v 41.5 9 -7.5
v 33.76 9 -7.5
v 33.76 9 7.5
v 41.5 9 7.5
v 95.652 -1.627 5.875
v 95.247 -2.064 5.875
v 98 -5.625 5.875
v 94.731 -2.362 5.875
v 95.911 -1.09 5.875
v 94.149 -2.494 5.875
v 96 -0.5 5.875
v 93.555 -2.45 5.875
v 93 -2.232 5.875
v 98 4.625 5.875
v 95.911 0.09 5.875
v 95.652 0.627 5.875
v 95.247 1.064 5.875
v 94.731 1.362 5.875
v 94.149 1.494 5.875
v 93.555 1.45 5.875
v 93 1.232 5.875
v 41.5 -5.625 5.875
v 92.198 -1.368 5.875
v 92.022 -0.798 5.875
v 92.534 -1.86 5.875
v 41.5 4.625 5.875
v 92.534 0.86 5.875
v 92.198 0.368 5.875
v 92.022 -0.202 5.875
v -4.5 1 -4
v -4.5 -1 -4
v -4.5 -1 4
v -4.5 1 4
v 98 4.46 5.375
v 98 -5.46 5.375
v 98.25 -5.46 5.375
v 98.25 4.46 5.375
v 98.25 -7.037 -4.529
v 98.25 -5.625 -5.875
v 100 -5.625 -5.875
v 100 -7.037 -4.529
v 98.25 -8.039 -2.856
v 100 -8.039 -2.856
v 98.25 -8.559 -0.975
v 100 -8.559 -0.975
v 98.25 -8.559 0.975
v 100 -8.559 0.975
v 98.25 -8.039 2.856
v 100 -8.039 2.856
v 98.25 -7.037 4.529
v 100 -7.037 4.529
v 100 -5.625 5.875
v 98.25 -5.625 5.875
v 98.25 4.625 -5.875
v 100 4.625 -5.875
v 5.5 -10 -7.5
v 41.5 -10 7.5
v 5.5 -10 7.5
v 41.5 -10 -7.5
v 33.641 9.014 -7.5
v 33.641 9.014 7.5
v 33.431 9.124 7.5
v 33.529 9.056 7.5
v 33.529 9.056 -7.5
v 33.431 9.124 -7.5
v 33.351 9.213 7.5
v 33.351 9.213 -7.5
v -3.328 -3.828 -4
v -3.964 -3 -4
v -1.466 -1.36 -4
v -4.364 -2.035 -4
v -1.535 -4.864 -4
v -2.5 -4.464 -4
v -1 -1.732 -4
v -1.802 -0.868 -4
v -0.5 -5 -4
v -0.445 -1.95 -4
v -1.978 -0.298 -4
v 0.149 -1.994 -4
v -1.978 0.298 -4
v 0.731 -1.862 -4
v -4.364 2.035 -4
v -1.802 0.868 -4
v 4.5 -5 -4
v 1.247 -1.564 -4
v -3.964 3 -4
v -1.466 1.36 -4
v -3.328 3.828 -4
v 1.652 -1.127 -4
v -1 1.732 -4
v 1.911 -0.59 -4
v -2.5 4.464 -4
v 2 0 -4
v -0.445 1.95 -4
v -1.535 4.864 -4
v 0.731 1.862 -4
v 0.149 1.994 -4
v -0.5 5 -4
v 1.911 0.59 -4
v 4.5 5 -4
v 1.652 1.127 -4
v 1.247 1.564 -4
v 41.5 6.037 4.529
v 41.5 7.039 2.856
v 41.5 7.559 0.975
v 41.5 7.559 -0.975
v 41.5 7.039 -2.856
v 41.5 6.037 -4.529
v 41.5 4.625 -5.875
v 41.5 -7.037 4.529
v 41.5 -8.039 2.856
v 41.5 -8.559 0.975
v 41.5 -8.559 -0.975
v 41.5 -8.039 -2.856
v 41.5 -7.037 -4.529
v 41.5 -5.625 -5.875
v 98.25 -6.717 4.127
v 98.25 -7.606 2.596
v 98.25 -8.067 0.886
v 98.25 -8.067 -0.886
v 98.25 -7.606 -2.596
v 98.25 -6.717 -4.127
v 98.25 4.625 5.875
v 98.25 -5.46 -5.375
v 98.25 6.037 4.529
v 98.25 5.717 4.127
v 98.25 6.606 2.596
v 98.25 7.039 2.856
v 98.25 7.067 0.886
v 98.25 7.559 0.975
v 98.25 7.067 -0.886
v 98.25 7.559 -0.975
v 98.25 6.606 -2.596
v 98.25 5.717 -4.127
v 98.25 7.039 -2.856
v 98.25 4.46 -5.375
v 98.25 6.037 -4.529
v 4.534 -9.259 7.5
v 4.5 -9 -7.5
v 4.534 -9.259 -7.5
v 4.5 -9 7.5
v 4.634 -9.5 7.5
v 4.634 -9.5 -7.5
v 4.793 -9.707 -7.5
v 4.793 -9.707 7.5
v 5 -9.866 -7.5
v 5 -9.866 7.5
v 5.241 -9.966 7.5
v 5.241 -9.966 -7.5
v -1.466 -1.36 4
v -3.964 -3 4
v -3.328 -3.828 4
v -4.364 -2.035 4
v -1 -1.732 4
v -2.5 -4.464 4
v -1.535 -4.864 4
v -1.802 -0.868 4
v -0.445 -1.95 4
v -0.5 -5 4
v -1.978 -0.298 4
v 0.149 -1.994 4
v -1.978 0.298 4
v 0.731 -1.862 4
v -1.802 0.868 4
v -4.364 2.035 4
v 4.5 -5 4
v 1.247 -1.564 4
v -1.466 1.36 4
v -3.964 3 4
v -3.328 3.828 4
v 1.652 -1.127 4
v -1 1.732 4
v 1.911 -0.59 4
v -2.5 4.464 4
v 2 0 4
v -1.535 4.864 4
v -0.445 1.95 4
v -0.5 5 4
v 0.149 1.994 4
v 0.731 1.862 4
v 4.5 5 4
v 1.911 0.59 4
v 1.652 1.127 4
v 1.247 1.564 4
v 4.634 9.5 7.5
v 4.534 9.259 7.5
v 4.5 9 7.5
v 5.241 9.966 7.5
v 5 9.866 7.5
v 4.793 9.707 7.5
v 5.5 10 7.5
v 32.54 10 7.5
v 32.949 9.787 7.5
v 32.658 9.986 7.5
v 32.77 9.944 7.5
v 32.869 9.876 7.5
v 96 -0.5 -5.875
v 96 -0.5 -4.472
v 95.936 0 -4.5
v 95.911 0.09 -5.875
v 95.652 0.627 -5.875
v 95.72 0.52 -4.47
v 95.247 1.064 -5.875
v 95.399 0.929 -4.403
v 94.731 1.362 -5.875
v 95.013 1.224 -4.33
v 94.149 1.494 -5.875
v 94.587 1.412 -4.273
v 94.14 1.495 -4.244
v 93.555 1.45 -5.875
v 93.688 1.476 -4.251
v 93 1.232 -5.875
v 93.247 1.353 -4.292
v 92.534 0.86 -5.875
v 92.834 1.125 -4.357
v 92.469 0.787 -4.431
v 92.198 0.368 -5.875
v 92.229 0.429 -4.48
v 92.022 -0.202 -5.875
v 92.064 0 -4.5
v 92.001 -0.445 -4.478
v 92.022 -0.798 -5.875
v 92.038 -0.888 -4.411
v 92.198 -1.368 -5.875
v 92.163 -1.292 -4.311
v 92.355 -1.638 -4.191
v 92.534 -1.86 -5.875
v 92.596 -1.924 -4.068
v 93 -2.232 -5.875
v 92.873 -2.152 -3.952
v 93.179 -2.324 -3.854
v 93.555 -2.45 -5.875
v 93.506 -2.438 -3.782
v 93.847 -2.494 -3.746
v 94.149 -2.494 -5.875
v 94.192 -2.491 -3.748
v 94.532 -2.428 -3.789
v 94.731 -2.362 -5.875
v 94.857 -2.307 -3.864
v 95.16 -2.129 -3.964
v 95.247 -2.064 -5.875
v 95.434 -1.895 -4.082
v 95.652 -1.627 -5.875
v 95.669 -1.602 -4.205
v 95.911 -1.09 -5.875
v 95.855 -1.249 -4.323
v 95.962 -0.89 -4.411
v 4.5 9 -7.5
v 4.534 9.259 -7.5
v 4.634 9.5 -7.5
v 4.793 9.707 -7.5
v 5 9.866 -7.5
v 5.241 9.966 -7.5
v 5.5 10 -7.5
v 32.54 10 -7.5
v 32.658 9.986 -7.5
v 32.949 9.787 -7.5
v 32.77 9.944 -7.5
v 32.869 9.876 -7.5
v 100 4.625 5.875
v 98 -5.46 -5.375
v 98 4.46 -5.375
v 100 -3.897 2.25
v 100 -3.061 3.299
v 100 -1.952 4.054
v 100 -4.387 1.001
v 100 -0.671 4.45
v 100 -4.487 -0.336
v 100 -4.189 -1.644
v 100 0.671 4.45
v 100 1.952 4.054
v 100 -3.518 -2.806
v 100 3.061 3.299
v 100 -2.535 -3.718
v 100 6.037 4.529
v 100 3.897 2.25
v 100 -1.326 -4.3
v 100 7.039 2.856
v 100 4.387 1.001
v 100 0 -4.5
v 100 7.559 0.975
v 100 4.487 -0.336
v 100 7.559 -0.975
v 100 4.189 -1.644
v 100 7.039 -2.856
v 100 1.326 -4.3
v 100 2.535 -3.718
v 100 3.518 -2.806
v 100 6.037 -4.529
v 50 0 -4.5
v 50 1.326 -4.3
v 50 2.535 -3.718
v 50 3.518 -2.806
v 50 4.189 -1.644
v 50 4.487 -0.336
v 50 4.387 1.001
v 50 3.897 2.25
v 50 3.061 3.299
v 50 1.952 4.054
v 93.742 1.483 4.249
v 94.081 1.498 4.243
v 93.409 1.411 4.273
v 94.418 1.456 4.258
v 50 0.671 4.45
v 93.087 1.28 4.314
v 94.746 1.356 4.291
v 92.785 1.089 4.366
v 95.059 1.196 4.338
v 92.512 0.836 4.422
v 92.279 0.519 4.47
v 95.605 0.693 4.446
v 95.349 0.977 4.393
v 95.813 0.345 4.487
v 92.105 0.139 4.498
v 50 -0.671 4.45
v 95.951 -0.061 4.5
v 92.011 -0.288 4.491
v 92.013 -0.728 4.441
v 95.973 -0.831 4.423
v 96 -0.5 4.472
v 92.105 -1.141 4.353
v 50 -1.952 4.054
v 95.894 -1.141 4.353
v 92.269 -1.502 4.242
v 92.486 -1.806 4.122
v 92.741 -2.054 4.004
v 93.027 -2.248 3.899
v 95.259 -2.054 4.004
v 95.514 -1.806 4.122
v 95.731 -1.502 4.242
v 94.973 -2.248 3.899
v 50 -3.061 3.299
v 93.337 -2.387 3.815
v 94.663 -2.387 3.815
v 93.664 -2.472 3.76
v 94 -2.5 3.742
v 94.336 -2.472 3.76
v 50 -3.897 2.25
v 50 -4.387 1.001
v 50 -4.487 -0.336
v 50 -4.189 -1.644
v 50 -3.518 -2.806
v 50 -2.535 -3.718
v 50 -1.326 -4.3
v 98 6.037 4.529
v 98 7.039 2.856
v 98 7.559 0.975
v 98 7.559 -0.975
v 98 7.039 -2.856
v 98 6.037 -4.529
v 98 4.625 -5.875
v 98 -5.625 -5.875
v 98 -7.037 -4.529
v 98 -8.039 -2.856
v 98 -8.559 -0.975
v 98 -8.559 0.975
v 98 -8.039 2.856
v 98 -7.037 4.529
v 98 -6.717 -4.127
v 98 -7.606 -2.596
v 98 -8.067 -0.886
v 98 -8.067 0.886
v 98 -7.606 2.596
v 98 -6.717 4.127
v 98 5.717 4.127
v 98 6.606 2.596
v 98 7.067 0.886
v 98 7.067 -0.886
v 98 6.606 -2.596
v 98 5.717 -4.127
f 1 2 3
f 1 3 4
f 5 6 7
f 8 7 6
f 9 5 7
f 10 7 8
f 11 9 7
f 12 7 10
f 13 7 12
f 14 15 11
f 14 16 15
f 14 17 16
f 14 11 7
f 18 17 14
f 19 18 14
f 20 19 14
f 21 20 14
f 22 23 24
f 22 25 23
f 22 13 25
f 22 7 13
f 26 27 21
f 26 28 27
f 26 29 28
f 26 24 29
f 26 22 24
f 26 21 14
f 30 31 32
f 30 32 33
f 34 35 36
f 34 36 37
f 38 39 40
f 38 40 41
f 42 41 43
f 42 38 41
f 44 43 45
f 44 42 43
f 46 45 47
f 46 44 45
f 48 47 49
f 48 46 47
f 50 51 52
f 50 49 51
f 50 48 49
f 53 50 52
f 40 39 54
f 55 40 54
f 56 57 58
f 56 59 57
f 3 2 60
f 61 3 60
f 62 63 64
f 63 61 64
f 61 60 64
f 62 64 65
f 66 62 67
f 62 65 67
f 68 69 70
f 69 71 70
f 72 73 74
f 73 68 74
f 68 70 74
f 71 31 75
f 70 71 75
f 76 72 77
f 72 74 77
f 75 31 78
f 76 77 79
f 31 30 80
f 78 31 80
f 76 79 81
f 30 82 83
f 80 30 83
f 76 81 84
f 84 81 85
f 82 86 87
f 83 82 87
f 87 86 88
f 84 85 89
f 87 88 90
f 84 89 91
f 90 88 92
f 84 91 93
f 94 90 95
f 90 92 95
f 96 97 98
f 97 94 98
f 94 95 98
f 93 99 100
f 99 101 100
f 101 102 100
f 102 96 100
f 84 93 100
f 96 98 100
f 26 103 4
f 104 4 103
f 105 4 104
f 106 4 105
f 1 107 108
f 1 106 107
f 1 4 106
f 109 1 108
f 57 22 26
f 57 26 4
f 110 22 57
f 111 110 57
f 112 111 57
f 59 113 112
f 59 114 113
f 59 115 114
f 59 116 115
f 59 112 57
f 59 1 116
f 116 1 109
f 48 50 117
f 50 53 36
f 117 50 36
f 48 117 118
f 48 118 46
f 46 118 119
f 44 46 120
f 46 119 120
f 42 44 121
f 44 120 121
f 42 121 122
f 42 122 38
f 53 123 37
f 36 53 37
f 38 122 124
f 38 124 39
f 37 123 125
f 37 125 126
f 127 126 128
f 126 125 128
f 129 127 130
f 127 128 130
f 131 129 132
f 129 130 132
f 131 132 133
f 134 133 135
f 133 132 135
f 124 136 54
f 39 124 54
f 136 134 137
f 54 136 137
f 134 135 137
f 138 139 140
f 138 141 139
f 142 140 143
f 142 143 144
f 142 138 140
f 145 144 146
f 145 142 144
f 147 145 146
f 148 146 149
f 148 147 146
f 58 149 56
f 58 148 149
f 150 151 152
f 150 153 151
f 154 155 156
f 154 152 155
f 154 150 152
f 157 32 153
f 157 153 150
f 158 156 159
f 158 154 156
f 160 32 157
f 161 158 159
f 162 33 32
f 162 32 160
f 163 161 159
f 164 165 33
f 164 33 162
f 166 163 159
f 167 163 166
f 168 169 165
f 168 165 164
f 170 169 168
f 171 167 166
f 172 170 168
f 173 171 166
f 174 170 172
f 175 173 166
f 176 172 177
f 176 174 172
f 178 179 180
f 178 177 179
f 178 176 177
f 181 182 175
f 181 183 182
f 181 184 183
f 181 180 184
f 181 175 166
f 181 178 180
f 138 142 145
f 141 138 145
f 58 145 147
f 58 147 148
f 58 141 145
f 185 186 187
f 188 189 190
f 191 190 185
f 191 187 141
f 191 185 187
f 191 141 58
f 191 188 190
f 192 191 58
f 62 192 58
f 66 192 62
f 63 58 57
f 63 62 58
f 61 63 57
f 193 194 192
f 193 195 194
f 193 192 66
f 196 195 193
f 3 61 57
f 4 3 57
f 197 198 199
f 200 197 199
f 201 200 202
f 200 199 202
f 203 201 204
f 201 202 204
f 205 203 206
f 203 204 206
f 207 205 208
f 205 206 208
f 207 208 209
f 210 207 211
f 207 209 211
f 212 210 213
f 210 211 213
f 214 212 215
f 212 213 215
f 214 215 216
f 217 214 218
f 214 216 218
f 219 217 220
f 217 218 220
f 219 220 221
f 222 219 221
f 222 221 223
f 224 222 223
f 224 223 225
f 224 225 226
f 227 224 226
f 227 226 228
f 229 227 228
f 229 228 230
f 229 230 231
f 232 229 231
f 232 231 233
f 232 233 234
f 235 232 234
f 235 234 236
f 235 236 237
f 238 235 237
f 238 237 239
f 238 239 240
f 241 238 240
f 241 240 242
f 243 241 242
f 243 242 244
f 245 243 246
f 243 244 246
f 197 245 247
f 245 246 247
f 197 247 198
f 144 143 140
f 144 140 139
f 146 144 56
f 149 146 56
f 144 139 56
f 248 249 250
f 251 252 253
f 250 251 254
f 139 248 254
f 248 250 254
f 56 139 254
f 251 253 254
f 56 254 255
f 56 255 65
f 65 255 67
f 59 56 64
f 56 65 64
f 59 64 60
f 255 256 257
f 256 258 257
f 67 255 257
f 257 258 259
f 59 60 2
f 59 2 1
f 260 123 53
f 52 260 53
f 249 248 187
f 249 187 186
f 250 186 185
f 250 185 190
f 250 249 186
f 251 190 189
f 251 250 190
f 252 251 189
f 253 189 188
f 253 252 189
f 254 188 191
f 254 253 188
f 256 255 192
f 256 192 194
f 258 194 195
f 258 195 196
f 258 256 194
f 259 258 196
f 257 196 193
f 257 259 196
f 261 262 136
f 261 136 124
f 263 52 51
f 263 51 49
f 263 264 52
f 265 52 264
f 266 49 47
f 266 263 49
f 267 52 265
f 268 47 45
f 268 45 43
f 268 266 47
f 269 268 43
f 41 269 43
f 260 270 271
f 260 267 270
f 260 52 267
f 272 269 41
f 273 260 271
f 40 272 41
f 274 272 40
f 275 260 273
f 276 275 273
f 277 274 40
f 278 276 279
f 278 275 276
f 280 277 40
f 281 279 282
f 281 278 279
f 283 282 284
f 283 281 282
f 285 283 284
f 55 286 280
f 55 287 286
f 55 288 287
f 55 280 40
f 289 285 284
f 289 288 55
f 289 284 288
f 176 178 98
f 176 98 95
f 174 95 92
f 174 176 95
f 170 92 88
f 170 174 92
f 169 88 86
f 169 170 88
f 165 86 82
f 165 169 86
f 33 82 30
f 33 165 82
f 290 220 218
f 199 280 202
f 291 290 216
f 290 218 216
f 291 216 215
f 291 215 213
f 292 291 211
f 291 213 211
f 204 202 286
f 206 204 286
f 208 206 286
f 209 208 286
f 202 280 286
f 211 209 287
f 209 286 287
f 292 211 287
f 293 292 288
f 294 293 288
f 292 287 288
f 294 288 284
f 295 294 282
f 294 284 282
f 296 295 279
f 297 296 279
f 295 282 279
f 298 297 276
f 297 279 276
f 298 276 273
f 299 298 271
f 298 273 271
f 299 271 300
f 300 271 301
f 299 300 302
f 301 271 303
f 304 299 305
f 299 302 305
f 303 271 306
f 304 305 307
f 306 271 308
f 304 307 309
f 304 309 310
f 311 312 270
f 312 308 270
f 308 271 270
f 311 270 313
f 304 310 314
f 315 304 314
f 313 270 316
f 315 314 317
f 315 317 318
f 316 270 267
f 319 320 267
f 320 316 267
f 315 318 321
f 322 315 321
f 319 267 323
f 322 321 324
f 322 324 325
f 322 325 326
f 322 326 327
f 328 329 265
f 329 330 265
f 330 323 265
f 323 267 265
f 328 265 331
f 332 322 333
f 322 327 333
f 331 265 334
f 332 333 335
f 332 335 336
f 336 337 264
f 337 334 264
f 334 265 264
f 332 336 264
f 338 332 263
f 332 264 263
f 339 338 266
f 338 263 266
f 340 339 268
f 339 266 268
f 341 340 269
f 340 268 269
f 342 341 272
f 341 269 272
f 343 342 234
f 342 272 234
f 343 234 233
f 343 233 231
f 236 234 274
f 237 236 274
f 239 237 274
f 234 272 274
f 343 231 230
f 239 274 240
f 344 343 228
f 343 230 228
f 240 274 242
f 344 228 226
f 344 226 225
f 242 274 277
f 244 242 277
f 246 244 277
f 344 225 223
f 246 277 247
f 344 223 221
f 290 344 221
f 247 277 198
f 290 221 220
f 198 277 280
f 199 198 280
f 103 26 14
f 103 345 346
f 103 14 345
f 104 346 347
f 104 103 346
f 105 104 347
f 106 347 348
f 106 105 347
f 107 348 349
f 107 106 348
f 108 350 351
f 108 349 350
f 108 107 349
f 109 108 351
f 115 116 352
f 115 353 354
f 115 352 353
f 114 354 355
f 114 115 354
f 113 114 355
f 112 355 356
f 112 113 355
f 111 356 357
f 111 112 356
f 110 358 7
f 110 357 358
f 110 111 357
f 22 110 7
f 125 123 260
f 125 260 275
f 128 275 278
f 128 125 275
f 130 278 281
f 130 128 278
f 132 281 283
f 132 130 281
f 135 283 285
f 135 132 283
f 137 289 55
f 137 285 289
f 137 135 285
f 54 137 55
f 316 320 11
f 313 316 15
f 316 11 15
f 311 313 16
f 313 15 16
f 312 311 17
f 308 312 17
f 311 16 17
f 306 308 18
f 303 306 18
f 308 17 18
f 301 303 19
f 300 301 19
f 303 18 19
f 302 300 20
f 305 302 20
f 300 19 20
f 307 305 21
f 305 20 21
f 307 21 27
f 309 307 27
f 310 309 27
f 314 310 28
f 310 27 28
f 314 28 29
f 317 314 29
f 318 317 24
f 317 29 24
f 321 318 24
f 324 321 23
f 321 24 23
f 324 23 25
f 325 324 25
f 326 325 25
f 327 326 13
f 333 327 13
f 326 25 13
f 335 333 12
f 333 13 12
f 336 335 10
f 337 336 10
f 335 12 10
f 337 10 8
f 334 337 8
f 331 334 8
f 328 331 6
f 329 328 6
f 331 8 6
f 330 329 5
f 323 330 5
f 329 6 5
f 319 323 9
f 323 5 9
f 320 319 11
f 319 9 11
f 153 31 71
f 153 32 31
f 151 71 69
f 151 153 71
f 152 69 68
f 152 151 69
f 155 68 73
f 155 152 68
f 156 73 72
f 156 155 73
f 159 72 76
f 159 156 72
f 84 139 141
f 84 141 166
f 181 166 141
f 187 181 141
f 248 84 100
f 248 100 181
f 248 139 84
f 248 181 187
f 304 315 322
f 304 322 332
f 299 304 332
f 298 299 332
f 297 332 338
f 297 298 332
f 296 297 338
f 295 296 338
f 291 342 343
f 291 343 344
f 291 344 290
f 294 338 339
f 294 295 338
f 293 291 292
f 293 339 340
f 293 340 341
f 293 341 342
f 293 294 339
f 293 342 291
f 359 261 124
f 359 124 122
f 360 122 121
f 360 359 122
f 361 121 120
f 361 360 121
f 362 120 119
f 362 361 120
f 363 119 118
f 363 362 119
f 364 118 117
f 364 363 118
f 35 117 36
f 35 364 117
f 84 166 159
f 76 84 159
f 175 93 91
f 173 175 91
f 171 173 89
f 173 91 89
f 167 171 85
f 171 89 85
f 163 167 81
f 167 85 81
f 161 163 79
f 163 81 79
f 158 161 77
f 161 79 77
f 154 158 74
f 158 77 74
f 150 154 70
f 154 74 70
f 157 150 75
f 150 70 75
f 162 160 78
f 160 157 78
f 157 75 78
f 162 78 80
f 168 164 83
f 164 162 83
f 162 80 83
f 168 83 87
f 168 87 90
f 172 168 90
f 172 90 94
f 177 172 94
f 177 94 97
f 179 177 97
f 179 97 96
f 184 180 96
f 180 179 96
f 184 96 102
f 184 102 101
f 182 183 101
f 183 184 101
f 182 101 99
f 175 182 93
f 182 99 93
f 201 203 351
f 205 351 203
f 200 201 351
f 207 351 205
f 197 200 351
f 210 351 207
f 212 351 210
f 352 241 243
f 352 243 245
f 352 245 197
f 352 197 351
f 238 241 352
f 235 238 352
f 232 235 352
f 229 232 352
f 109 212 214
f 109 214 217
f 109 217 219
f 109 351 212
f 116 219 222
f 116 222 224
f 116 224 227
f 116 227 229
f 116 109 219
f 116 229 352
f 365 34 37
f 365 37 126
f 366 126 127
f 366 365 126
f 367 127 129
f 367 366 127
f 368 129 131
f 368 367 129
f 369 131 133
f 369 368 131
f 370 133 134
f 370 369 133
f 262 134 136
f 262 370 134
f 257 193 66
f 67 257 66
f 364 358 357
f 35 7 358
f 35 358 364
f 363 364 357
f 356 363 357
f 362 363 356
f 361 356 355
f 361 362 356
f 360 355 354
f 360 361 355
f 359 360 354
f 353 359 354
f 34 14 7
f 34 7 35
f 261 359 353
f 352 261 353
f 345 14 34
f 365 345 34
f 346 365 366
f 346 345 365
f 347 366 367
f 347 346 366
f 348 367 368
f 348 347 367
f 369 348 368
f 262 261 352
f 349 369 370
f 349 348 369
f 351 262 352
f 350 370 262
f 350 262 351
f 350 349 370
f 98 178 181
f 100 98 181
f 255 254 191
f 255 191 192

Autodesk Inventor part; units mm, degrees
ref_plane "YZ Plane" through (0, 0, 0) normal (1, 0, 0) x (0, 1, 0)
ref_plane "XZ Plane" through (0, 0, 0) normal (0, 1, 0) x (-1, 0, 0)
ref_plane "XY Plane" through (0, 0, 0) normal (0, 0, 1) x (1, 0, 0)
sketch "Base" plane through (0, 0, 0) normal (0, 0, 1) x (1, 0, 0)
  circle A0 centre (0, 0) radius 2
  line L0 (-4.5, 5) -> (4.5, 5)
  line L1 (4.5, 5) -> (4.5, -5)
  line L2 (4.5, -5) -> (-4.5, -5)
  line L3 (-4.5, -5) -> (-4.5, 5)
  line L4 (4.5, 0) -> (-4.5, 0) construction
  line L5 (4.5, 10) -> (41.5, 10)
  line L6 (41.5, 10) -> (41.5, -10)
  line L7 (41.5, -10) -> (4.5, -10)
  line L8 (4.5, -10) -> (4.5, 10)
  dimension "d0" = 4
  dimension "d1" = 10
  dimension "d2" = 9
  dimension "d3" = 20
  dimension "d4" = 37
extrude "Extrusion1" add sketch "Base" along normal mid plane 8 contours L0 L1 L2 L3
extrude "Extrusion2" add sketch "Base" along normal mid plane 15 contours L8 L5 L6 L7 L1
fillet "Fillet1" radius 4 2 edges at (-4.5, -5, 0) (-4.5, 5, 0)
fillet "Fillet2" radius 1 2 edges at (4.5, 10, 0) (4.5, -10, 0)
sketch "Sketch2" plane through (0, 0, 7.5) normal (0, 0, 1) x (1, 0, 0)
  arc A0 (4.5, -9) -> (5.5, -10) centre (5.5, -9) ccw projected
  line L0 (5.5, -10) -> (41.5, -10) projected
  line L1 (41.5, -10) -> (41.5, 10) projected
  line L2 (41.5, 10) -> (5.5, 10) projected
  arc A1 (5.5, 10) -> (4.5, 9) centre (5.5, 9) ccw projected
  line L3 (4.5, 9) -> (4.5, -9) projected
  line L4 (32.7998, 10) -> (33.5, 9)
  line L5 (33.5, 9) -> (41.5, 9)
  line L6 (41.5, -10) -> (41.5, 10) projected
  line L7 (41.5, 10) -> (5.5, 10) projected
  point P0 (0, 0)
  dimension "d11" = 1
  dimension "d12" = 8
  dimension "d13" = 125
extrude "Extrusion3" cut sketch "Sketch2" against normal up to surface (15 mm away) contours L5 L4 L2 L1
fillet "Fillet3" radius 0.5 2 edges at (32.7998, 10, 0) (33.5, 9, 0)
sketch "Sketch3" plane through (41.5, -10, 7.5) normal (1, 0, 0) x (0, 0, -1)
  line L0 (15, 19) -> (0, 19) construction
  line L1 (7.5, 19) -> (7.5, 0) construction
  line L2 (0, 0) -> (15, 0) construction
  line L3 (1.625, 14.625) -> (13.375, 14.625) construction
  line L4 (13.375, 14.625) -> (13.375, 4.375)
  line L5 (13.375, 4.375) -> (1.625, 4.375) construction
  line L6 (1.625, 4.375) -> (1.625, 14.625)
  line L7 (0, 0) -> (0, 19) construction
  line L8 (0, 9.5) -> (15, 9.5) construction
  line L9 (15, 19) -> (15, 0) construction
  arc A0 (13.375, 14.625) -> (1.625, 14.625) centre (7.5, 10.3724) ccw
  arc A1 (1.625, 4.375) -> (13.375, 4.375) centre (7.5, 8.6276) ccw
  point P0 (7.5, 10)
  point P1 (7.5, 14.625)
  point P2 (1.625, 9.5)
  point P3 (7.5, 17.625)
  point P4 (7.5, 1.375)
  dimension "d17" = 11.75
  dimension "d18" = 3
  dimension "d21" = 16.25
extrude "Extrusion4" add sketch "Sketch3" along normal blind 56.5
sketch "Sketch4" plane through (98, -10, 7.5) normal (1, 0, 0) x (0, 0, -1)
  line L0 (13.375, 4.375) -> (13.375, 14.625) projected
  arc A0 (13.375, 14.625) -> (1.625, 14.625) centre (7.5, 10.3724) ccw projected
  line L1 (1.625, 14.625) -> (1.625, 4.375) projected
  arc A1 (1.625, 4.375) -> (13.375, 4.375) centre (7.5, 8.6276) ccw projected
  arc A2 (12.875, 14.4598) -> (2.125, 14.4598) centre (7.5, 10.3724) ccw
  line L2 (12.875, 14.4598) -> (12.875, 4.5402)
  arc A3 (2.125, 4.5402) -> (12.875, 4.5402) centre (7.5, 8.6276) ccw
  line L3 (2.125, 4.5402) -> (2.125, 14.4598)
  point P0 (7.5, 10)
  dimension "d22" = 0.5
extrude "Extrusion5" add sketch "Sketch4" along normal blind 0.25 contours L2 A3 L3 A2
sketch "Sketch5" plane through (98.25, -10, 7.5) normal (1, 0, 0) x (0, 0, -1)
  arc A0 (13.375, 14.625) -> (1.625, 14.625) centre (7.5, 10.3724) ccw projected
  line L0 (1.625, 14.625) -> (1.625, 4.375) projected
  arc A1 (1.625, 4.375) -> (13.375, 4.375) centre (7.5, 8.6276) ccw projected
  line L1 (13.375, 4.375) -> (13.375, 14.625) projected
  point P0 (7.5, 10)
extrude "Extrusion6" add sketch "Sketch5" along normal blind 1.75
sketch "Sketch6" plane through (100, -10, 7.5) normal (1, 0, 0) x (0, 0, -1)
  circle A0 centre (7.5, 10) radius 4.5
  dimension "d27" = 9
extrude "Extrusion7" cut sketch "Sketch6" against normal blind 50
sketch "Sketch7" plane through (41.5, -5.625, 5.875) normal (0, 0, 1) x (1, 0, 0)
  line L0 (58.5, 0) -> (58.5, 10.25) projected
  line L1 (58.5, 5.125) -> (54.5, 5.125) construction
  circle A0 centre (52.5, 5.125) radius 2
  line L2 (52.5, 5.125) -> (54.5, 5.125) construction
  point P0 (-41.5, 5.625)
  dimension "d31" = 4
  dimension "d30" = 4
extrude "Extrusion8" cut sketch "Sketch7" against normal through all
properties part number "LA-T8-1215-50 105-64 Body"
